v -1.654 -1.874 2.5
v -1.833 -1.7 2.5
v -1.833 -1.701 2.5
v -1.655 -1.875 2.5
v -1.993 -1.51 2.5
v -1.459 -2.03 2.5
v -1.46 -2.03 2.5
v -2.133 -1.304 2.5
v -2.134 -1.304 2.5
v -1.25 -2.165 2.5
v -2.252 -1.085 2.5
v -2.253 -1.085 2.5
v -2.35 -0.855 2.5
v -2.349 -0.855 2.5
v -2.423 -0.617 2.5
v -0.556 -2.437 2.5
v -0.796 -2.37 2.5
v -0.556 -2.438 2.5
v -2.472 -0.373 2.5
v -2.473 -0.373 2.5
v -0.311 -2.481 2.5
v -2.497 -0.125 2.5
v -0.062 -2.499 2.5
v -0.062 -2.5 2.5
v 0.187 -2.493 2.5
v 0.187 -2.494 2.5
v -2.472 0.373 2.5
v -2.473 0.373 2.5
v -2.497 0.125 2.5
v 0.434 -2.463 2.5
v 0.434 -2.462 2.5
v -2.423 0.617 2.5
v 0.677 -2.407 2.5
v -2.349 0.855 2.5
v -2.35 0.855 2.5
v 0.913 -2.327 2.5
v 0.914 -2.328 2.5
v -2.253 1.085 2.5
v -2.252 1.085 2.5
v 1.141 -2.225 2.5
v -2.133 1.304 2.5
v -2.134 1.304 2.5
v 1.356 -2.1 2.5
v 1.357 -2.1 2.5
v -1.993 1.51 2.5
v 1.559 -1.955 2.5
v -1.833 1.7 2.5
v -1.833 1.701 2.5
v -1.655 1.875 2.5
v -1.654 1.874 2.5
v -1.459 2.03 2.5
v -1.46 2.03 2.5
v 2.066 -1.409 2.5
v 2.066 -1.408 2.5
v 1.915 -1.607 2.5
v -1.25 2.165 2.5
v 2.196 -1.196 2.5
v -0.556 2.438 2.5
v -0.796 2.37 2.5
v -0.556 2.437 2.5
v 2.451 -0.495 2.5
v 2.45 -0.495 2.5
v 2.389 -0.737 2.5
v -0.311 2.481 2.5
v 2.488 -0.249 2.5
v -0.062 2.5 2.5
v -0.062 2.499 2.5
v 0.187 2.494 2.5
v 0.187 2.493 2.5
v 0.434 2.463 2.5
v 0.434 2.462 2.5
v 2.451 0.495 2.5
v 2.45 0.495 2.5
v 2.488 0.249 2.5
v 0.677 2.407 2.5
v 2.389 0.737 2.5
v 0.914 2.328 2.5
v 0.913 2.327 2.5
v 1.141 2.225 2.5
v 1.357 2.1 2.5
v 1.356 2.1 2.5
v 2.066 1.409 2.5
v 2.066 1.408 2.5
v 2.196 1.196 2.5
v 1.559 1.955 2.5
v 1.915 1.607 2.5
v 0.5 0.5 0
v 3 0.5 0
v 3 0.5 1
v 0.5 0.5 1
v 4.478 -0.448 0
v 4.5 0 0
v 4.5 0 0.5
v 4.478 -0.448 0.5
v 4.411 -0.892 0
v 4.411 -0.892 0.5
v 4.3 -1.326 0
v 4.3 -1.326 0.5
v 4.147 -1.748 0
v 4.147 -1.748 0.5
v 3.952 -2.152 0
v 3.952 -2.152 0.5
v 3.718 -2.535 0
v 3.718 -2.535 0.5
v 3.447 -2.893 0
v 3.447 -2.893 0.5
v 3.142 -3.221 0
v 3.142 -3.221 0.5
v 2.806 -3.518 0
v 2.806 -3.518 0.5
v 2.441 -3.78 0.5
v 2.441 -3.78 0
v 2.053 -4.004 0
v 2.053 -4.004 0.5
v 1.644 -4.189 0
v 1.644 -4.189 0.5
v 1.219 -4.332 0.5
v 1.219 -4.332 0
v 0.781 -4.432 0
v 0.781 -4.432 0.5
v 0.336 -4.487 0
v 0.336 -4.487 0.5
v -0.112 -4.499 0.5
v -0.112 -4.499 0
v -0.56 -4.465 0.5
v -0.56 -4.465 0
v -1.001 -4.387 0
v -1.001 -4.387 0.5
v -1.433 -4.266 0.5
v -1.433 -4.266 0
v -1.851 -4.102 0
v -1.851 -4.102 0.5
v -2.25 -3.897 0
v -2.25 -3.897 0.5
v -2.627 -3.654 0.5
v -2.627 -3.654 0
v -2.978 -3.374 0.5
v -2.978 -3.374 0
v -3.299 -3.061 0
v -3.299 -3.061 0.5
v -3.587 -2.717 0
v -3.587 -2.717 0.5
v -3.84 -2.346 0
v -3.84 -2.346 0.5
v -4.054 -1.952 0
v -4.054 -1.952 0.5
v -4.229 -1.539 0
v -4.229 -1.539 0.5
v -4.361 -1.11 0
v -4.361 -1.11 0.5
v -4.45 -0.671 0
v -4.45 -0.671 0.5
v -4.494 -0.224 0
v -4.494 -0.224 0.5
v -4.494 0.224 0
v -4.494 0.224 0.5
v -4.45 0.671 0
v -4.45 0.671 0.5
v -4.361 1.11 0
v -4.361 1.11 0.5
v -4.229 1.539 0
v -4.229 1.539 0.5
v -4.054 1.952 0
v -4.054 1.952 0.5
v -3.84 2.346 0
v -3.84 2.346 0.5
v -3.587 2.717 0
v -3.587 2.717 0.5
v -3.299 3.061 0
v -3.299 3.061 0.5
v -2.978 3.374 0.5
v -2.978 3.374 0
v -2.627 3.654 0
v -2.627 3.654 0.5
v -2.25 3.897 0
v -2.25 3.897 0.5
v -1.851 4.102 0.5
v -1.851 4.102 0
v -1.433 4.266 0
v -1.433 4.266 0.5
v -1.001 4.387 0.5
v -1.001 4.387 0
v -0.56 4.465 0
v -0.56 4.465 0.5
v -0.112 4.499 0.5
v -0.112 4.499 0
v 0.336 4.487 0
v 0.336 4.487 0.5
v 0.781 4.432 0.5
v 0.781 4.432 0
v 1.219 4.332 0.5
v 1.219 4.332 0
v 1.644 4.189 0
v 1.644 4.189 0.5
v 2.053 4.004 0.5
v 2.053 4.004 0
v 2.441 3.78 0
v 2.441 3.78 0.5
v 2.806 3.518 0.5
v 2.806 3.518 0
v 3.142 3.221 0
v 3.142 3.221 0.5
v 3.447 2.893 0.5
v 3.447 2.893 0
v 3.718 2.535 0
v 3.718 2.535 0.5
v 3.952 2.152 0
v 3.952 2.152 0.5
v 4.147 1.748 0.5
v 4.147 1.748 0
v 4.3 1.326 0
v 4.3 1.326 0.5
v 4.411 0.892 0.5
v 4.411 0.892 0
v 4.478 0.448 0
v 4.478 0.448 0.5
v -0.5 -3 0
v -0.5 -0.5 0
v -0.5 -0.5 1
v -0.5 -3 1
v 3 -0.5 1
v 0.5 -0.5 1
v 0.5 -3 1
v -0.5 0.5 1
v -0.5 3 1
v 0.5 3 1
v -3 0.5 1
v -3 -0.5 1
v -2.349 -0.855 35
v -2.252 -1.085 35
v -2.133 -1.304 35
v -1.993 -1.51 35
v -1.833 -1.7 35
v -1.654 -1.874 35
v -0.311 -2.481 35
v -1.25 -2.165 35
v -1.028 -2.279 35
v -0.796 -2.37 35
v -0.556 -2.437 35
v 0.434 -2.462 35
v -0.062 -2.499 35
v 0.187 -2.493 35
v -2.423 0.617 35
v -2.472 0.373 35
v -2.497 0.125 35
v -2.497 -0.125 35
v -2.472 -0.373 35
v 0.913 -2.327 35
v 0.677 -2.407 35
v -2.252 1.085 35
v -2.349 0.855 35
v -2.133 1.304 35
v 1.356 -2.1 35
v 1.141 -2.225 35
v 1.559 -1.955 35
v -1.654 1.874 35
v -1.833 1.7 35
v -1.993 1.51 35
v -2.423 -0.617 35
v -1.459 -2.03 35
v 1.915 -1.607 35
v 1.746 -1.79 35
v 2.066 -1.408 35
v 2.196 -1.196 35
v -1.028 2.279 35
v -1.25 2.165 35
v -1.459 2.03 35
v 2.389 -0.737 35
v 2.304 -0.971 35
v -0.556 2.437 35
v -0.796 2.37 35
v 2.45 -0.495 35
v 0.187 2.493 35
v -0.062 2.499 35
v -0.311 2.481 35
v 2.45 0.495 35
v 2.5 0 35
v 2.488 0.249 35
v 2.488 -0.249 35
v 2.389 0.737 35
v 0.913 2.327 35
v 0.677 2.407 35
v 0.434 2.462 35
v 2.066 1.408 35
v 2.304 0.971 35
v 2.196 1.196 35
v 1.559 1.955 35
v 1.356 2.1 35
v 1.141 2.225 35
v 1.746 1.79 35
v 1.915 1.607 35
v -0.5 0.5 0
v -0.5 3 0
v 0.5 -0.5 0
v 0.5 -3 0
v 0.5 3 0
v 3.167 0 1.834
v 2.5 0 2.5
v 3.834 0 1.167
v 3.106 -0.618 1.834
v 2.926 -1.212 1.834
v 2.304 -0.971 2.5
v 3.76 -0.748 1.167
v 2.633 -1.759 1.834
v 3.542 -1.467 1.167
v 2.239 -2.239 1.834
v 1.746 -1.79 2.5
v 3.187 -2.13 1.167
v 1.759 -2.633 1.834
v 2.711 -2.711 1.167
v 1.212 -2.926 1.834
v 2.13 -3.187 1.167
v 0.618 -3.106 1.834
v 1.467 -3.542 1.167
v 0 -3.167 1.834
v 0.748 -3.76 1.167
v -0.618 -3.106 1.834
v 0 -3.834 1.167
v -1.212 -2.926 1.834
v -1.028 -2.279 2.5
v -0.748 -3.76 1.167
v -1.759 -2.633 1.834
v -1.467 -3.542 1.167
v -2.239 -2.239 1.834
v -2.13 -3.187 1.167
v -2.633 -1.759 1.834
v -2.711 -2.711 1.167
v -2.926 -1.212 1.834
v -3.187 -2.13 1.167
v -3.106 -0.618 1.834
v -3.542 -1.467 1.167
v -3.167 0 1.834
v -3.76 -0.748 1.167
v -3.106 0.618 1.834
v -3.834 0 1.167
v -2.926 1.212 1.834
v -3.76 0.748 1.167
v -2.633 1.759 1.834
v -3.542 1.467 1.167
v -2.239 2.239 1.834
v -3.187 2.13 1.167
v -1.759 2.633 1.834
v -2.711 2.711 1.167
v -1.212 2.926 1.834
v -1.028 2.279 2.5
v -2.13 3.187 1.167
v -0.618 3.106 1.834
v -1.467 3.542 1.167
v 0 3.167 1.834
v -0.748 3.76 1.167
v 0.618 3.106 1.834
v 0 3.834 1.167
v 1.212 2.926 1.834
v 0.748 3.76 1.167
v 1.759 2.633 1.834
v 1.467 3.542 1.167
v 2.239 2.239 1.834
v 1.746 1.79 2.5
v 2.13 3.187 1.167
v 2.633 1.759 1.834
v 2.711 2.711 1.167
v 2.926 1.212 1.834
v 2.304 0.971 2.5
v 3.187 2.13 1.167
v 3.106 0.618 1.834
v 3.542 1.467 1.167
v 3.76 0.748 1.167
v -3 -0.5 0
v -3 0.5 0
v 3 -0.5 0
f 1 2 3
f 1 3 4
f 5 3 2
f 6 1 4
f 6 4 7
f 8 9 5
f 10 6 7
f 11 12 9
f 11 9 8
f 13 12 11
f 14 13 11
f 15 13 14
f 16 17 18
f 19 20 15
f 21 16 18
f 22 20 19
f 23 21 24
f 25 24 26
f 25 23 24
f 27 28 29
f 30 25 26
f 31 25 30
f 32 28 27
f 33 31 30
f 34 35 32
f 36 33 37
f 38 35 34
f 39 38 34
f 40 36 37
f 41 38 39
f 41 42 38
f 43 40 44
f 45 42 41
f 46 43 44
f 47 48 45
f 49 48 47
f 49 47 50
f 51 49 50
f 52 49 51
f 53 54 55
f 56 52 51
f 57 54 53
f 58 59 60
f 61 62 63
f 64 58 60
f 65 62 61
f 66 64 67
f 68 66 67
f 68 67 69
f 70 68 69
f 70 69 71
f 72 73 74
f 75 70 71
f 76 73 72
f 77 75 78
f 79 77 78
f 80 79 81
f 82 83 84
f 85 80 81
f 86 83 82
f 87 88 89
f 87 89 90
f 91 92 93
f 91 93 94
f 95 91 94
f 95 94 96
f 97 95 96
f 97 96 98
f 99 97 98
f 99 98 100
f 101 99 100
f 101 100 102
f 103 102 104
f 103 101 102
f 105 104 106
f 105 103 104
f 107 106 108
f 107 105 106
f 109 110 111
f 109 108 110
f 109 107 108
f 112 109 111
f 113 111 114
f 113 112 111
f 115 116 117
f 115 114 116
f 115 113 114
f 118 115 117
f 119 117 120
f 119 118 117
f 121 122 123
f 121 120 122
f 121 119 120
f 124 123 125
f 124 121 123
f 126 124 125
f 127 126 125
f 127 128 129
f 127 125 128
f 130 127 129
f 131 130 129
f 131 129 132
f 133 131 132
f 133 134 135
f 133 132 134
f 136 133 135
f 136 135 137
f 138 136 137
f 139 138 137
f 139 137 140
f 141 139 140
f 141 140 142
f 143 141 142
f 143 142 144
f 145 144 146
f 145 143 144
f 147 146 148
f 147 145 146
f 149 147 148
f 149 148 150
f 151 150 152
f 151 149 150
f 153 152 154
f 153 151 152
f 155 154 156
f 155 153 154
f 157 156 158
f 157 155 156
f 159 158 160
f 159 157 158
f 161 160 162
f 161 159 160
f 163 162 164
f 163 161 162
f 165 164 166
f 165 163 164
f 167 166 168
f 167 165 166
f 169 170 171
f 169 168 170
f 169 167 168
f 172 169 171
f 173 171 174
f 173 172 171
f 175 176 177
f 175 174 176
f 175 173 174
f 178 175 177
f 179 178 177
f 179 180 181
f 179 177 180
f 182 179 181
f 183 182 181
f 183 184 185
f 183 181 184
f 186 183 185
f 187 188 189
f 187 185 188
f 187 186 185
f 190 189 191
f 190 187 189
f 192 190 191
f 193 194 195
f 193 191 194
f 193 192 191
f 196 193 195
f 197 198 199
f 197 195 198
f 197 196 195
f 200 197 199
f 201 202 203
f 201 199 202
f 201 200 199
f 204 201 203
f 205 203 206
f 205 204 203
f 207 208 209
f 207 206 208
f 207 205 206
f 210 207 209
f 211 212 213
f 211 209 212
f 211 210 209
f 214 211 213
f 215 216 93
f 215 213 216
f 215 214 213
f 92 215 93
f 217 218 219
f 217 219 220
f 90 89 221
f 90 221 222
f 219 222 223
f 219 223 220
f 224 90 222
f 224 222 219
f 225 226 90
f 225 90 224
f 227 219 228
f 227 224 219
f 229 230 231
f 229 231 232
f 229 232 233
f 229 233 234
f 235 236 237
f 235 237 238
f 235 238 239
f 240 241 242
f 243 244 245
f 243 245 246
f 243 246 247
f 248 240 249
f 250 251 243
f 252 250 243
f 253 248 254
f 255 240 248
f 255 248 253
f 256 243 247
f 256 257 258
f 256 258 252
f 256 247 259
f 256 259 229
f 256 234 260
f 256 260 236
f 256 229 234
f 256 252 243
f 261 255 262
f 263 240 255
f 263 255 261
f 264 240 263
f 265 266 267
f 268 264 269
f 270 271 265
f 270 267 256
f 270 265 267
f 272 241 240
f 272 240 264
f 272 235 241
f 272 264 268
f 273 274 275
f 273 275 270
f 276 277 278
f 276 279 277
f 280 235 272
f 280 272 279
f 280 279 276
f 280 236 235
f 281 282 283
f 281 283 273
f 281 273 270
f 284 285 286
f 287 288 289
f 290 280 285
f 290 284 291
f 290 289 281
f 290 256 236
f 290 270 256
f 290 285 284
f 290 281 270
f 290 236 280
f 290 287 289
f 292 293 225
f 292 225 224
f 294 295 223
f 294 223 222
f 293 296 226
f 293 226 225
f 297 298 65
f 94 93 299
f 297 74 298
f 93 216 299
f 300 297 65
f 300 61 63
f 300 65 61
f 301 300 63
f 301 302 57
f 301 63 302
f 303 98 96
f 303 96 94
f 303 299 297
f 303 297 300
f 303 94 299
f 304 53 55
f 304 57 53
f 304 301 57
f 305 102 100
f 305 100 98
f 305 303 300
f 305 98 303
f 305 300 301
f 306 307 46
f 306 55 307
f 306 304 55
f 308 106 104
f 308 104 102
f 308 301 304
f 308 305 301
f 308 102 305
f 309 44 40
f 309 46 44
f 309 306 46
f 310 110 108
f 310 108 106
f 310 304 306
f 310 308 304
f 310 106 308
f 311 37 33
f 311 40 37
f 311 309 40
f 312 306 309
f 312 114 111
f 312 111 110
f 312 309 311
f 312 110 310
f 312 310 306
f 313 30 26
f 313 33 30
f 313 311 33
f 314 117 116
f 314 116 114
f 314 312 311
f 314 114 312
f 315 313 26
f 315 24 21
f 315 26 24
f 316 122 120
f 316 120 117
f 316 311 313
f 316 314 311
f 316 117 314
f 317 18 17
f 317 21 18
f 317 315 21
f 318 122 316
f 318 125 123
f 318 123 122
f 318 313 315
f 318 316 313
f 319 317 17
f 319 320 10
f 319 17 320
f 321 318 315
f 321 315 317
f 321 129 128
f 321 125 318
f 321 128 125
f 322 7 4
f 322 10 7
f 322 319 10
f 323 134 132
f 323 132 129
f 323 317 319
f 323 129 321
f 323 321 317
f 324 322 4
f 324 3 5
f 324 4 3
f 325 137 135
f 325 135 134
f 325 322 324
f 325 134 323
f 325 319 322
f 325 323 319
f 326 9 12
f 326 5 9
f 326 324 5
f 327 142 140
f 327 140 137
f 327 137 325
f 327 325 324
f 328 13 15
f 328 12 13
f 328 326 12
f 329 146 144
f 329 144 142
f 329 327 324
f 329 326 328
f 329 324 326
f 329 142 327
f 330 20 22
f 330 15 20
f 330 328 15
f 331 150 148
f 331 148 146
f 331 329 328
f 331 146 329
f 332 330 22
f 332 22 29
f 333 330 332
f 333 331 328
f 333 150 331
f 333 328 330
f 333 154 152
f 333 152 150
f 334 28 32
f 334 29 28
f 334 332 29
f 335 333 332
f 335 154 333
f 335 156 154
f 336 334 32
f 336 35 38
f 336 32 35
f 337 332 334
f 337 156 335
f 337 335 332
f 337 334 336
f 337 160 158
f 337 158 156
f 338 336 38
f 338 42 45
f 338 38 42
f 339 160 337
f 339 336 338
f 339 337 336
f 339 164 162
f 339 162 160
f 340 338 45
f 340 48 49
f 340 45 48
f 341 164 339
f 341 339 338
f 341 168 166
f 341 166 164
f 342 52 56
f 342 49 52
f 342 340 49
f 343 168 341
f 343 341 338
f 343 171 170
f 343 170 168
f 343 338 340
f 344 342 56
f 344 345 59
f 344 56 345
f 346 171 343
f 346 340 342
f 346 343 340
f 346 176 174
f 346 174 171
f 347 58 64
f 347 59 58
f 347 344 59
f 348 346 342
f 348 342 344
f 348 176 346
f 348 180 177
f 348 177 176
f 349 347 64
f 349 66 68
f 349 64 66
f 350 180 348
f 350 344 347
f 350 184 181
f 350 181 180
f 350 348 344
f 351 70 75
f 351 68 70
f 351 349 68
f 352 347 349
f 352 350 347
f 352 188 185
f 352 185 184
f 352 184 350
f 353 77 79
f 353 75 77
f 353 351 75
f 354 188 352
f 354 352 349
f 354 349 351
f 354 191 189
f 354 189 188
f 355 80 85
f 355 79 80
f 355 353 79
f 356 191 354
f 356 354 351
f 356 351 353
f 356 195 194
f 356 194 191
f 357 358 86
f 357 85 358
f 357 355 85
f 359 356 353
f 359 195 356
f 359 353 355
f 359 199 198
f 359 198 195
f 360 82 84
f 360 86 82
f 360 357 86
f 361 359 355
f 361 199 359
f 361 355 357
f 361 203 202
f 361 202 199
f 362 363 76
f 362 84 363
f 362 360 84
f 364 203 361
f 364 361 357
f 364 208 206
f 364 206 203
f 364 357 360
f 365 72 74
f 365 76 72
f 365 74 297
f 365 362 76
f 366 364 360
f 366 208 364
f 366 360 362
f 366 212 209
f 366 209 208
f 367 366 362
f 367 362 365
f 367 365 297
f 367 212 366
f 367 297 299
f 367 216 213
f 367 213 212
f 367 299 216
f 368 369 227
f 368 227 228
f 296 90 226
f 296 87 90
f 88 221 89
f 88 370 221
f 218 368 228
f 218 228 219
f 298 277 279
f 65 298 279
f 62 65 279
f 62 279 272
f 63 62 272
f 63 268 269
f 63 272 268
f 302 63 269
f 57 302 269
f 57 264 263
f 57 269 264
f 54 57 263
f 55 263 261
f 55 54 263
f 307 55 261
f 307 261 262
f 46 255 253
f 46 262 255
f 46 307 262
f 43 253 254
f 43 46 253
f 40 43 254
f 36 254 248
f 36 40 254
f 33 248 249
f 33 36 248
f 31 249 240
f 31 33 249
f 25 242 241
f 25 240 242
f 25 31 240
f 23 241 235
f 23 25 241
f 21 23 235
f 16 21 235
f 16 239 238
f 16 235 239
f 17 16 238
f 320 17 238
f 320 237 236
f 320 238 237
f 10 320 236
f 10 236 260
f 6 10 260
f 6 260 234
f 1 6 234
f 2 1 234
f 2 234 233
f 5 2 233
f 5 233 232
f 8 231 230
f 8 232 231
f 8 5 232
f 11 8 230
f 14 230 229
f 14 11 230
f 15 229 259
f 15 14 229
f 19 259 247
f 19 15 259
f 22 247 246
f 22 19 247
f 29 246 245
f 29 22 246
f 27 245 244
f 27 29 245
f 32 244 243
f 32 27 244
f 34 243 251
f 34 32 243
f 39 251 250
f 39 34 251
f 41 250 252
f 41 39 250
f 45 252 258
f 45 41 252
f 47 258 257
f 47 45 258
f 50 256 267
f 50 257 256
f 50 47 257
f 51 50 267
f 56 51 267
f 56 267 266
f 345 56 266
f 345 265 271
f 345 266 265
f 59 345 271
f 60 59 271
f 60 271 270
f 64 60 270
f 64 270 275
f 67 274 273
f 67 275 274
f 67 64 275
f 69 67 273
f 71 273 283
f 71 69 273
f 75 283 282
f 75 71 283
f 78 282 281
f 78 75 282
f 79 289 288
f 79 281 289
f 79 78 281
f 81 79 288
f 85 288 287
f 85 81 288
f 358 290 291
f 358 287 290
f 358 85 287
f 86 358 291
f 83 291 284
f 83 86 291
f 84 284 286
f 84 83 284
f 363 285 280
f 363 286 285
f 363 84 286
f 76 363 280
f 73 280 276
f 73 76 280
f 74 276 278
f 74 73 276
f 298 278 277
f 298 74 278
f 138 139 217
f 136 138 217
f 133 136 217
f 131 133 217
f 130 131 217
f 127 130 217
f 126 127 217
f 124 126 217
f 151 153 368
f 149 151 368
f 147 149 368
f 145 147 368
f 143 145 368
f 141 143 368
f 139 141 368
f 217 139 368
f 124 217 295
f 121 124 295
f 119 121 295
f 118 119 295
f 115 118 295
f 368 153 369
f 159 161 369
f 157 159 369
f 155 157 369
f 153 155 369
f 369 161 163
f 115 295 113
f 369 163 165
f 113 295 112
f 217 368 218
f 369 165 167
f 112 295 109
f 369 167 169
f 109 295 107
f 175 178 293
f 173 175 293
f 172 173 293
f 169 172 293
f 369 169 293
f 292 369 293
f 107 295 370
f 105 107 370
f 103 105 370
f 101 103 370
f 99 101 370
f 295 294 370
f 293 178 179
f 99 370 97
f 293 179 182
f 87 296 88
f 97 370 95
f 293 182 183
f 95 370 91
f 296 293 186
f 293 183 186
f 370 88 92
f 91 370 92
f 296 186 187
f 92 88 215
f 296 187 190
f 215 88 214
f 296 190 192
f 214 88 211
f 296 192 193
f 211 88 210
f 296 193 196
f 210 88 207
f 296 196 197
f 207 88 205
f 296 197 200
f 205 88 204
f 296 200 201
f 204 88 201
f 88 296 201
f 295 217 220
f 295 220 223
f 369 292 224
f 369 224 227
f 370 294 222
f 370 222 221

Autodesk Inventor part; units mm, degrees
ref_plane "YZ Plane" through (0, 0, 0) normal (1, 0, 0) x (0, 1, 0)
ref_plane "XZ Plane" through (0, 0, 0) normal (0, 1, 0) x (-1, 0, 0)
ref_plane "XY Plane" through (0, 0, 0) normal (0, 0, 1) x (1, 0, 0)
sketch "Эскиз1" plane through (0, 0, 0) normal (0, 0, 1) x (1, 0, 0)
  circle A0 centre (0, 0) radius 4.5
  dimension "d0" = 9
extrude "Выдавливание1" add sketch "Эскиз1" along normal blind 2.5
sketch "Эскиз2" plane through (0, 0, 2.5) normal (0, 0, 1) x (1, 0, 0)
  circle A0 centre (0, 0) radius 2.5
  dimension "d3" = 5
extrude "Выдавливание2" add sketch "Эскиз2" along normal blind 32.5
chamfer "Фаска1" distance 2 angle 45 1 edges at (-4.5, 0, 2.5)
thread "Резьба1" size "M5x0.8" class "6g" standard "ANSI Metric M Profile" full length
sketch "Эскиз3" plane through (0, 0, 0) normal (0, 0, -1) x (-1, 0, 0)
  line L0 (-3, 0.5) -> (3, 0.5)
  line L1 (3, 0.5) -> (3, -0.5)
  line L2 (3, -0.5) -> (-3, -0.5)
  line L3 (-3, -0.5) -> (-3, 0.5)
  line L4 (-0.5, 3) -> (0.5, 3)
  line L5 (0.5, 3) -> (0.5, -3)
  line L6 (0.5, -3) -> (-0.5, -3)
  line L7 (-0.5, -3) -> (-0.5, 3)
  line L8 (0, 3) -> (0, -3) construction
  line L9 (-3, 0) -> (3, 0) construction
  point P0 (0, 0)
  point P1 (0, 0)
  point P2 (-0.5, 0.5)
  point P3 (-0.5, -0.5)
  point P4 (0.5, 0.5)
  point P5 (0.5, -0.5)
  dimension "d12" = 1
  dimension "d13" = 6
extrude "Выдавливание3" cut sketch "Эскиз3" against normal blind 1
properties part number "Болт М5х35"
